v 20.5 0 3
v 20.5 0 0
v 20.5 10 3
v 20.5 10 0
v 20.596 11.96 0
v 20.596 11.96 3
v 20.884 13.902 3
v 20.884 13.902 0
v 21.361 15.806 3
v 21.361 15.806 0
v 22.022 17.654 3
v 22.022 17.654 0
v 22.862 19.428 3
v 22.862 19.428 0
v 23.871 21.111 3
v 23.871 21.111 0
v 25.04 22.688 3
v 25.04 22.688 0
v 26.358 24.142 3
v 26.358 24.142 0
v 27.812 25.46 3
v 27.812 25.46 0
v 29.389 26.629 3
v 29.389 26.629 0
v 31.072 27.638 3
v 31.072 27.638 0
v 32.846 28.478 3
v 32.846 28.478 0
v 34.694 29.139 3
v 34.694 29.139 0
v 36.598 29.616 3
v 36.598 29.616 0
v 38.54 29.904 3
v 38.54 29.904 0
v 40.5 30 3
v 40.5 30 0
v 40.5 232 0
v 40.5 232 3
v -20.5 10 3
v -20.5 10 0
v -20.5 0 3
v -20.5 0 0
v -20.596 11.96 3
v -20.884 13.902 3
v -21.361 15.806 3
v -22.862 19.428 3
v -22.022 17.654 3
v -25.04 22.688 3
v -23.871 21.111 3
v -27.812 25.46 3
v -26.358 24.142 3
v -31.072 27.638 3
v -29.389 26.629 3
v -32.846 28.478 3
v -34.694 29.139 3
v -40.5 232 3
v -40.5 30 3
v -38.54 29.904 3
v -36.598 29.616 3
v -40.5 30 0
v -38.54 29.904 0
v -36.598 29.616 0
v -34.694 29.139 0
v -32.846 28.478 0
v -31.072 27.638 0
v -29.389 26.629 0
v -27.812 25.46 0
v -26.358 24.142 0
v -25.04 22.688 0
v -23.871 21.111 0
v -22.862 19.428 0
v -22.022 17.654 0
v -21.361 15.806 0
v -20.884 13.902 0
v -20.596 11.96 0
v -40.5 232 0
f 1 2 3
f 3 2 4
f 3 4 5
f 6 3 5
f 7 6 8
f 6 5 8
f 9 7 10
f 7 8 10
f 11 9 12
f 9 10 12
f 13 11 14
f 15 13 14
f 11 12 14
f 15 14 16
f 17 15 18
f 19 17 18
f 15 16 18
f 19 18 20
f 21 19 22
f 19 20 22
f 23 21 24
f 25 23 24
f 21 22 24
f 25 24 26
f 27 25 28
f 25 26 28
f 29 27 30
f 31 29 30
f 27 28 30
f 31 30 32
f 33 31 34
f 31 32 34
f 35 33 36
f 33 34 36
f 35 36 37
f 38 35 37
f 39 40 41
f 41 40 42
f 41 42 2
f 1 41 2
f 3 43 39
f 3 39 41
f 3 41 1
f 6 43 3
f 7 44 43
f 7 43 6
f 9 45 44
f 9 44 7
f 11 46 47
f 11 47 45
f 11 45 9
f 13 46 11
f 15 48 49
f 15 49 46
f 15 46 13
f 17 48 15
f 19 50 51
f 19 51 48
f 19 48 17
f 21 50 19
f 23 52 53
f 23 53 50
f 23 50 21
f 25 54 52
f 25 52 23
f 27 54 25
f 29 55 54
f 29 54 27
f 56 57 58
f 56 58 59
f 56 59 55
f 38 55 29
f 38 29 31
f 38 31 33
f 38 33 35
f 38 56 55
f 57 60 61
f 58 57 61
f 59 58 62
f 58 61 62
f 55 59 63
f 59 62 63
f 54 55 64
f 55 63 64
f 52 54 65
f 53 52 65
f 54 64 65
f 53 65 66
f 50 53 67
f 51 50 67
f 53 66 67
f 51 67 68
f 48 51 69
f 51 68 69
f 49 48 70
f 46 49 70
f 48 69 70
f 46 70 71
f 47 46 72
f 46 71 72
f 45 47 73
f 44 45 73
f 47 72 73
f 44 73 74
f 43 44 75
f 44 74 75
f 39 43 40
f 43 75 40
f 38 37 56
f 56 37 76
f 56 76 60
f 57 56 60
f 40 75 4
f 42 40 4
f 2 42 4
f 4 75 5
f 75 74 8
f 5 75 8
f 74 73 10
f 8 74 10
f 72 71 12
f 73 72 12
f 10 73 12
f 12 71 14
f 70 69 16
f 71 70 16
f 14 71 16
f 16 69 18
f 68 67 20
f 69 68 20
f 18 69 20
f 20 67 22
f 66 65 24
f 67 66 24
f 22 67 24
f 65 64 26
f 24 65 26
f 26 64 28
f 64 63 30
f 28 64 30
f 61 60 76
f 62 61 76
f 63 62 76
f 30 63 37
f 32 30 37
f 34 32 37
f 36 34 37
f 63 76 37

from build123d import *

# Parameters (mm, degrees)
EXTRUSION1_DEPTH = 3


with BuildPart() as part:
    # Esquisse1 → Extrusion1 (new body)
    with BuildSketch(Plane.XY):
        with BuildLine():
            Line((40.5, 232), (-40.5, 232))
            Line((-40.5, 232), (-40.5, 30))
            ThreePointArc((-40.5, 30), (-26.357864376, 24.142135624), (-20.5, 10))
            Line((-20.5, 10), (-20.5, 0))
            Line((-20.5, 0), (20.5, 0))
            Line((20.5, 0), (20.5, 10))
            ThreePointArc((20.5, 10), (26.357864376, 24.142135624), (40.5, 30))
            Line((40.5, 30), (40.5, 232))
        make_face()
    extrude(amount=EXTRUSION1_DEPTH)


solid = part.part
